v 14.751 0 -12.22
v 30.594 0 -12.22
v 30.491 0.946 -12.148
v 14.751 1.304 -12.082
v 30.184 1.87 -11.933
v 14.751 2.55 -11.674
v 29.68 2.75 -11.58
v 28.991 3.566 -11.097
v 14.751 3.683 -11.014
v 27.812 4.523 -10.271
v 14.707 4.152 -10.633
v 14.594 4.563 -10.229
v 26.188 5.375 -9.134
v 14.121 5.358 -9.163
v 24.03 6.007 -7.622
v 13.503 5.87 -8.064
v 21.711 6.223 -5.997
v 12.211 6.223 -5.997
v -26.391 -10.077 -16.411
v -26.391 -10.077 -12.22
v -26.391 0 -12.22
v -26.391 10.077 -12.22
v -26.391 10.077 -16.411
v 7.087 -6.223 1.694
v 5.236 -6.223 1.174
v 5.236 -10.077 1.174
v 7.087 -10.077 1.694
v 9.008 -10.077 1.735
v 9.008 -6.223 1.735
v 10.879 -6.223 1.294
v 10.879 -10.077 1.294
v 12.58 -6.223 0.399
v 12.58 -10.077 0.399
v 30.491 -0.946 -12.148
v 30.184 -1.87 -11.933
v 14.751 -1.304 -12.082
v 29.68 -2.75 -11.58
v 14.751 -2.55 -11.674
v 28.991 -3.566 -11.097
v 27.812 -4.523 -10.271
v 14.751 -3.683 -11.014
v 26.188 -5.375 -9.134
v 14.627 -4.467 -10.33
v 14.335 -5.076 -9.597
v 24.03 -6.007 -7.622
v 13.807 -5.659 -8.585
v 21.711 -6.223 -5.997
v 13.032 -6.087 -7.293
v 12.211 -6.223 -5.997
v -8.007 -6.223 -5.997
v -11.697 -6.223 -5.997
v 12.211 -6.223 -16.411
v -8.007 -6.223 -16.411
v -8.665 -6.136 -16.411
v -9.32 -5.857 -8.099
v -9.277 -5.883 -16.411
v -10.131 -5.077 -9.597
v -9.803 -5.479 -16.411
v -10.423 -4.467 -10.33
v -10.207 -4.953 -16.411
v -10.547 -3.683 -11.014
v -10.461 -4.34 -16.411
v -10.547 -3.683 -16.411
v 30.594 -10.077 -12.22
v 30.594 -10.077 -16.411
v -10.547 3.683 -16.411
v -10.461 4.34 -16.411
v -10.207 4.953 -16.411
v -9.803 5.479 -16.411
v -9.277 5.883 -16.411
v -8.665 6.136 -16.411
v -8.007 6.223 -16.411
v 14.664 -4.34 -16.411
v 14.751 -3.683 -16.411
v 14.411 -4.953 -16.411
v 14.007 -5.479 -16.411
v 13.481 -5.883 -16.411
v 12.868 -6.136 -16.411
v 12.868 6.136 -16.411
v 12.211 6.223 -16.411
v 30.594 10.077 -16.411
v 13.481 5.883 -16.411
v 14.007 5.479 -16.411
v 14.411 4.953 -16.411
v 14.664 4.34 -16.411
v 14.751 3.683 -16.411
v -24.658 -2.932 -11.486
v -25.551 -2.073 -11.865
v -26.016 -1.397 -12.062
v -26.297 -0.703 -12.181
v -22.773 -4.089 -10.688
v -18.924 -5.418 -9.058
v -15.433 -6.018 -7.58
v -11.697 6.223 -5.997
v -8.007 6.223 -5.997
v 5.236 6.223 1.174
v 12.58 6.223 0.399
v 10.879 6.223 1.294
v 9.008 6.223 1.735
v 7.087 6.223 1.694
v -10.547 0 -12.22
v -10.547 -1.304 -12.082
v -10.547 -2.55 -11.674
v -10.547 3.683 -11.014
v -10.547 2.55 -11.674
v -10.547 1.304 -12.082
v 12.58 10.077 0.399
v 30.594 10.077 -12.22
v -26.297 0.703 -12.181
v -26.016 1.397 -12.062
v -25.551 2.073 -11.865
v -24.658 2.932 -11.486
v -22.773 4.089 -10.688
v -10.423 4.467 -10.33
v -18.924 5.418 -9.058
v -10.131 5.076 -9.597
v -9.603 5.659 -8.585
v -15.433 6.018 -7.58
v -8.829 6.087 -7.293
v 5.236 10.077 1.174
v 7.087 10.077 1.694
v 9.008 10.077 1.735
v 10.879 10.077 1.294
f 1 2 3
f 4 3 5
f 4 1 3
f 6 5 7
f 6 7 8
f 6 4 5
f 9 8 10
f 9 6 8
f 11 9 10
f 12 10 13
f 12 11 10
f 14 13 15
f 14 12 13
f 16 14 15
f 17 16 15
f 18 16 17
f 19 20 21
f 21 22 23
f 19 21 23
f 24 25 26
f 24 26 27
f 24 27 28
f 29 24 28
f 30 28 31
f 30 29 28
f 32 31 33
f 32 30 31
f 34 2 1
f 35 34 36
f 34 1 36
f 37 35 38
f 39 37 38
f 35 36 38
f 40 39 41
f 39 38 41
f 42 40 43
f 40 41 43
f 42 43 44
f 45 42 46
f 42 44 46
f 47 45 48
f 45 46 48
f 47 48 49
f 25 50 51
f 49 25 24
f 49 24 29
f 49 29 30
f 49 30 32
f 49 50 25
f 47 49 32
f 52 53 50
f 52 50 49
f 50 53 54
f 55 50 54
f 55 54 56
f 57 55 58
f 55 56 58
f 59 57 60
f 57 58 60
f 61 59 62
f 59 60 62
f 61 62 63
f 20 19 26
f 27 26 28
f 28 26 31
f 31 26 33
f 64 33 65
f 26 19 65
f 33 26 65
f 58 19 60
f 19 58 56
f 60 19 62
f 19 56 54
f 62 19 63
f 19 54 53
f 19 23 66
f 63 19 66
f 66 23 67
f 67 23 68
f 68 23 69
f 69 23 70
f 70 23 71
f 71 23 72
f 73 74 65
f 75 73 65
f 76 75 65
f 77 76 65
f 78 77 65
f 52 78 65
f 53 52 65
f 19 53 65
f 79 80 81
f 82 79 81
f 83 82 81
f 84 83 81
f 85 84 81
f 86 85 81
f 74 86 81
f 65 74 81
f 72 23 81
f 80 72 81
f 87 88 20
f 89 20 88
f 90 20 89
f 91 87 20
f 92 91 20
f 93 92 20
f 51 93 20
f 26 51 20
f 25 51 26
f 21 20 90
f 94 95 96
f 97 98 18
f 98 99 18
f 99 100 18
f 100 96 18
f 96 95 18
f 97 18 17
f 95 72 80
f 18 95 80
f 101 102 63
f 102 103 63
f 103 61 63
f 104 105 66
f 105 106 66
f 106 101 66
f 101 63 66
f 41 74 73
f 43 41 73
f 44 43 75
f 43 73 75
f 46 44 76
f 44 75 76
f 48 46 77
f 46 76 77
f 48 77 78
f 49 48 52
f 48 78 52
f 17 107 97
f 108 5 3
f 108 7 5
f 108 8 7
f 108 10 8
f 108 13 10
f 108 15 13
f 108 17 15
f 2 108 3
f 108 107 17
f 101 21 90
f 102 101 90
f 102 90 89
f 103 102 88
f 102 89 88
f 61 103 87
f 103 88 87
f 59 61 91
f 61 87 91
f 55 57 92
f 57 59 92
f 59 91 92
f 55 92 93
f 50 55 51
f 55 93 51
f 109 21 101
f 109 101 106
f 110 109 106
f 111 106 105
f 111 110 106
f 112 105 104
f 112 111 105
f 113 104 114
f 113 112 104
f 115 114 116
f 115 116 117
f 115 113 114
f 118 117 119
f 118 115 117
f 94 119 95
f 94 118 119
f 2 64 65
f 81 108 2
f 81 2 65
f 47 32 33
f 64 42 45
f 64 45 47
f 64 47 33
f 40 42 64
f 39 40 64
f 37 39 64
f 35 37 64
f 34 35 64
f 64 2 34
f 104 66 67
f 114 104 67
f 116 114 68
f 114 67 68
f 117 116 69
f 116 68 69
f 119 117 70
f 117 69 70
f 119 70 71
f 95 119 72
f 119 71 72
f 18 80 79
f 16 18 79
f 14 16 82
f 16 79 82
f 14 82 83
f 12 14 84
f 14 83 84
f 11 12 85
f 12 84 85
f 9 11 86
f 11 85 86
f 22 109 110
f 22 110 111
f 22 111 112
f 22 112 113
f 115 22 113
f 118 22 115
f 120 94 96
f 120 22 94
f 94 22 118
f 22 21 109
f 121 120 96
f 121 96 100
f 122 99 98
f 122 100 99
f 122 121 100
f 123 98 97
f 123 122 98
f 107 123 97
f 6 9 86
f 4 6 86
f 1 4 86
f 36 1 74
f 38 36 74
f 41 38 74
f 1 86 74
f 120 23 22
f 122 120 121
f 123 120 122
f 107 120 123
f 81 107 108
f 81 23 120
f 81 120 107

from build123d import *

# Parameters (mm, degrees)
SKETCH1_W           = 56.9849
SKETCH1_H           = 4.191
BOSS_EXTRUDE2_DEPTH = 10.07745
CUT_EXTRUDE2_DEPTH  = 6.223
FILLET8_R           = 6.223
CUT_EXTRUDE5_DEPTH  = 37.991848321


with BuildPart() as part:
    # Sketch1 → Boss-Extrude2 (new, symmetric)
    with BuildSketch(Plane(origin=(0, 0, 0), x_dir=(1, 0, 0), z_dir=(0, 1, 0))):
        with Locations((2.101827362, 14.315884605)):
            Rectangle(SKETCH1_W, SKETCH1_H)
        with BuildLine():
            Line((-26.390622638, 12.220384605), (5.236321347, -1.174073262))
            ThreePointArc((5.236321347, -1.174073262), (9.008282942, -1.735261042), (12.579803169, -0.398522749))
            Line((12.579803169, -0.398522749), (30.594277362, 12.220384605))
            Line((30.594277362, 12.220384605), (-26.390622638, 12.220384605))
        make_face()
    extrude(amount=BOSS_EXTRUDE2_DEPTH, both=True)

    # Sketch1<16> → Cut-Extrude2 (cut, symmetric)
    with BuildSketch(Plane(origin=(0, 0, 0), x_dir=(1, 0, 0), z_dir=(0, 1, 0))):
        with BuildLine():
            Line((-26.390622638, 12.220384605), (5.236321347, -1.174073262))
            ThreePointArc((5.236321347, -1.174073262), (9.008282942, -1.735261042), (12.579803169, -0.398522749))
            Line((12.579803169, -0.398522749), (30.594277362, 12.220384605))
            Line((30.594277362, 12.220384605), (-26.390622638, 12.220384605))
        make_face()
    extrude(amount=CUT_EXTRUDE2_DEPTH, both=True, mode=Mode.SUBTRACT)

    # Fillet8
    fillet8_edges = [part.edges().sort_by_distance(p)[0] for p in [
        (2.101827362, 6.223, -12.220384605),
        (2.101827362, -6.223, -12.220384605),
    ]]
    fillet(fillet8_edges, radius=FILLET8_R - 0.0001)  # a hair under: the kernel refuses the full size

    # Sketch3 → Cut-Extrude5 (cut, through all)
    with BuildSketch(Plane(origin=(0, 0, -16.411384605), x_dir=(-1, 0, 0), z_dir=(0, 0, -1))):
        with BuildLine():
            Line((-12.211027362, -6.223), (8.007372638, -6.223))
            ThreePointArc((8.007372638, -6.223), (9.803423862, -5.479051224), (10.547372638, -3.683))
            Line((10.547372638, -3.683), (10.547372638, 3.683))
            ThreePointArc((10.547372638, 3.683), (9.803423862, 5.479051224), (8.007372638, 6.223))
            Line((8.007372638, 6.223), (-12.211027362, 6.223))
            ThreePointArc((-12.211027362, 6.223), (-14.007078586, 5.479051224), (-14.751027362, 3.683))
            Line((-14.751027362, 3.683), (-14.751027362, -3.683))
            ThreePointArc((-14.751027362, -3.683), (-14.007078586, -5.479051224), (-12.211027362, -6.223))
        make_face()
    extrude(amount=-CUT_EXTRUDE5_DEPTH, mode=Mode.SUBTRACT)


solid = part.part
